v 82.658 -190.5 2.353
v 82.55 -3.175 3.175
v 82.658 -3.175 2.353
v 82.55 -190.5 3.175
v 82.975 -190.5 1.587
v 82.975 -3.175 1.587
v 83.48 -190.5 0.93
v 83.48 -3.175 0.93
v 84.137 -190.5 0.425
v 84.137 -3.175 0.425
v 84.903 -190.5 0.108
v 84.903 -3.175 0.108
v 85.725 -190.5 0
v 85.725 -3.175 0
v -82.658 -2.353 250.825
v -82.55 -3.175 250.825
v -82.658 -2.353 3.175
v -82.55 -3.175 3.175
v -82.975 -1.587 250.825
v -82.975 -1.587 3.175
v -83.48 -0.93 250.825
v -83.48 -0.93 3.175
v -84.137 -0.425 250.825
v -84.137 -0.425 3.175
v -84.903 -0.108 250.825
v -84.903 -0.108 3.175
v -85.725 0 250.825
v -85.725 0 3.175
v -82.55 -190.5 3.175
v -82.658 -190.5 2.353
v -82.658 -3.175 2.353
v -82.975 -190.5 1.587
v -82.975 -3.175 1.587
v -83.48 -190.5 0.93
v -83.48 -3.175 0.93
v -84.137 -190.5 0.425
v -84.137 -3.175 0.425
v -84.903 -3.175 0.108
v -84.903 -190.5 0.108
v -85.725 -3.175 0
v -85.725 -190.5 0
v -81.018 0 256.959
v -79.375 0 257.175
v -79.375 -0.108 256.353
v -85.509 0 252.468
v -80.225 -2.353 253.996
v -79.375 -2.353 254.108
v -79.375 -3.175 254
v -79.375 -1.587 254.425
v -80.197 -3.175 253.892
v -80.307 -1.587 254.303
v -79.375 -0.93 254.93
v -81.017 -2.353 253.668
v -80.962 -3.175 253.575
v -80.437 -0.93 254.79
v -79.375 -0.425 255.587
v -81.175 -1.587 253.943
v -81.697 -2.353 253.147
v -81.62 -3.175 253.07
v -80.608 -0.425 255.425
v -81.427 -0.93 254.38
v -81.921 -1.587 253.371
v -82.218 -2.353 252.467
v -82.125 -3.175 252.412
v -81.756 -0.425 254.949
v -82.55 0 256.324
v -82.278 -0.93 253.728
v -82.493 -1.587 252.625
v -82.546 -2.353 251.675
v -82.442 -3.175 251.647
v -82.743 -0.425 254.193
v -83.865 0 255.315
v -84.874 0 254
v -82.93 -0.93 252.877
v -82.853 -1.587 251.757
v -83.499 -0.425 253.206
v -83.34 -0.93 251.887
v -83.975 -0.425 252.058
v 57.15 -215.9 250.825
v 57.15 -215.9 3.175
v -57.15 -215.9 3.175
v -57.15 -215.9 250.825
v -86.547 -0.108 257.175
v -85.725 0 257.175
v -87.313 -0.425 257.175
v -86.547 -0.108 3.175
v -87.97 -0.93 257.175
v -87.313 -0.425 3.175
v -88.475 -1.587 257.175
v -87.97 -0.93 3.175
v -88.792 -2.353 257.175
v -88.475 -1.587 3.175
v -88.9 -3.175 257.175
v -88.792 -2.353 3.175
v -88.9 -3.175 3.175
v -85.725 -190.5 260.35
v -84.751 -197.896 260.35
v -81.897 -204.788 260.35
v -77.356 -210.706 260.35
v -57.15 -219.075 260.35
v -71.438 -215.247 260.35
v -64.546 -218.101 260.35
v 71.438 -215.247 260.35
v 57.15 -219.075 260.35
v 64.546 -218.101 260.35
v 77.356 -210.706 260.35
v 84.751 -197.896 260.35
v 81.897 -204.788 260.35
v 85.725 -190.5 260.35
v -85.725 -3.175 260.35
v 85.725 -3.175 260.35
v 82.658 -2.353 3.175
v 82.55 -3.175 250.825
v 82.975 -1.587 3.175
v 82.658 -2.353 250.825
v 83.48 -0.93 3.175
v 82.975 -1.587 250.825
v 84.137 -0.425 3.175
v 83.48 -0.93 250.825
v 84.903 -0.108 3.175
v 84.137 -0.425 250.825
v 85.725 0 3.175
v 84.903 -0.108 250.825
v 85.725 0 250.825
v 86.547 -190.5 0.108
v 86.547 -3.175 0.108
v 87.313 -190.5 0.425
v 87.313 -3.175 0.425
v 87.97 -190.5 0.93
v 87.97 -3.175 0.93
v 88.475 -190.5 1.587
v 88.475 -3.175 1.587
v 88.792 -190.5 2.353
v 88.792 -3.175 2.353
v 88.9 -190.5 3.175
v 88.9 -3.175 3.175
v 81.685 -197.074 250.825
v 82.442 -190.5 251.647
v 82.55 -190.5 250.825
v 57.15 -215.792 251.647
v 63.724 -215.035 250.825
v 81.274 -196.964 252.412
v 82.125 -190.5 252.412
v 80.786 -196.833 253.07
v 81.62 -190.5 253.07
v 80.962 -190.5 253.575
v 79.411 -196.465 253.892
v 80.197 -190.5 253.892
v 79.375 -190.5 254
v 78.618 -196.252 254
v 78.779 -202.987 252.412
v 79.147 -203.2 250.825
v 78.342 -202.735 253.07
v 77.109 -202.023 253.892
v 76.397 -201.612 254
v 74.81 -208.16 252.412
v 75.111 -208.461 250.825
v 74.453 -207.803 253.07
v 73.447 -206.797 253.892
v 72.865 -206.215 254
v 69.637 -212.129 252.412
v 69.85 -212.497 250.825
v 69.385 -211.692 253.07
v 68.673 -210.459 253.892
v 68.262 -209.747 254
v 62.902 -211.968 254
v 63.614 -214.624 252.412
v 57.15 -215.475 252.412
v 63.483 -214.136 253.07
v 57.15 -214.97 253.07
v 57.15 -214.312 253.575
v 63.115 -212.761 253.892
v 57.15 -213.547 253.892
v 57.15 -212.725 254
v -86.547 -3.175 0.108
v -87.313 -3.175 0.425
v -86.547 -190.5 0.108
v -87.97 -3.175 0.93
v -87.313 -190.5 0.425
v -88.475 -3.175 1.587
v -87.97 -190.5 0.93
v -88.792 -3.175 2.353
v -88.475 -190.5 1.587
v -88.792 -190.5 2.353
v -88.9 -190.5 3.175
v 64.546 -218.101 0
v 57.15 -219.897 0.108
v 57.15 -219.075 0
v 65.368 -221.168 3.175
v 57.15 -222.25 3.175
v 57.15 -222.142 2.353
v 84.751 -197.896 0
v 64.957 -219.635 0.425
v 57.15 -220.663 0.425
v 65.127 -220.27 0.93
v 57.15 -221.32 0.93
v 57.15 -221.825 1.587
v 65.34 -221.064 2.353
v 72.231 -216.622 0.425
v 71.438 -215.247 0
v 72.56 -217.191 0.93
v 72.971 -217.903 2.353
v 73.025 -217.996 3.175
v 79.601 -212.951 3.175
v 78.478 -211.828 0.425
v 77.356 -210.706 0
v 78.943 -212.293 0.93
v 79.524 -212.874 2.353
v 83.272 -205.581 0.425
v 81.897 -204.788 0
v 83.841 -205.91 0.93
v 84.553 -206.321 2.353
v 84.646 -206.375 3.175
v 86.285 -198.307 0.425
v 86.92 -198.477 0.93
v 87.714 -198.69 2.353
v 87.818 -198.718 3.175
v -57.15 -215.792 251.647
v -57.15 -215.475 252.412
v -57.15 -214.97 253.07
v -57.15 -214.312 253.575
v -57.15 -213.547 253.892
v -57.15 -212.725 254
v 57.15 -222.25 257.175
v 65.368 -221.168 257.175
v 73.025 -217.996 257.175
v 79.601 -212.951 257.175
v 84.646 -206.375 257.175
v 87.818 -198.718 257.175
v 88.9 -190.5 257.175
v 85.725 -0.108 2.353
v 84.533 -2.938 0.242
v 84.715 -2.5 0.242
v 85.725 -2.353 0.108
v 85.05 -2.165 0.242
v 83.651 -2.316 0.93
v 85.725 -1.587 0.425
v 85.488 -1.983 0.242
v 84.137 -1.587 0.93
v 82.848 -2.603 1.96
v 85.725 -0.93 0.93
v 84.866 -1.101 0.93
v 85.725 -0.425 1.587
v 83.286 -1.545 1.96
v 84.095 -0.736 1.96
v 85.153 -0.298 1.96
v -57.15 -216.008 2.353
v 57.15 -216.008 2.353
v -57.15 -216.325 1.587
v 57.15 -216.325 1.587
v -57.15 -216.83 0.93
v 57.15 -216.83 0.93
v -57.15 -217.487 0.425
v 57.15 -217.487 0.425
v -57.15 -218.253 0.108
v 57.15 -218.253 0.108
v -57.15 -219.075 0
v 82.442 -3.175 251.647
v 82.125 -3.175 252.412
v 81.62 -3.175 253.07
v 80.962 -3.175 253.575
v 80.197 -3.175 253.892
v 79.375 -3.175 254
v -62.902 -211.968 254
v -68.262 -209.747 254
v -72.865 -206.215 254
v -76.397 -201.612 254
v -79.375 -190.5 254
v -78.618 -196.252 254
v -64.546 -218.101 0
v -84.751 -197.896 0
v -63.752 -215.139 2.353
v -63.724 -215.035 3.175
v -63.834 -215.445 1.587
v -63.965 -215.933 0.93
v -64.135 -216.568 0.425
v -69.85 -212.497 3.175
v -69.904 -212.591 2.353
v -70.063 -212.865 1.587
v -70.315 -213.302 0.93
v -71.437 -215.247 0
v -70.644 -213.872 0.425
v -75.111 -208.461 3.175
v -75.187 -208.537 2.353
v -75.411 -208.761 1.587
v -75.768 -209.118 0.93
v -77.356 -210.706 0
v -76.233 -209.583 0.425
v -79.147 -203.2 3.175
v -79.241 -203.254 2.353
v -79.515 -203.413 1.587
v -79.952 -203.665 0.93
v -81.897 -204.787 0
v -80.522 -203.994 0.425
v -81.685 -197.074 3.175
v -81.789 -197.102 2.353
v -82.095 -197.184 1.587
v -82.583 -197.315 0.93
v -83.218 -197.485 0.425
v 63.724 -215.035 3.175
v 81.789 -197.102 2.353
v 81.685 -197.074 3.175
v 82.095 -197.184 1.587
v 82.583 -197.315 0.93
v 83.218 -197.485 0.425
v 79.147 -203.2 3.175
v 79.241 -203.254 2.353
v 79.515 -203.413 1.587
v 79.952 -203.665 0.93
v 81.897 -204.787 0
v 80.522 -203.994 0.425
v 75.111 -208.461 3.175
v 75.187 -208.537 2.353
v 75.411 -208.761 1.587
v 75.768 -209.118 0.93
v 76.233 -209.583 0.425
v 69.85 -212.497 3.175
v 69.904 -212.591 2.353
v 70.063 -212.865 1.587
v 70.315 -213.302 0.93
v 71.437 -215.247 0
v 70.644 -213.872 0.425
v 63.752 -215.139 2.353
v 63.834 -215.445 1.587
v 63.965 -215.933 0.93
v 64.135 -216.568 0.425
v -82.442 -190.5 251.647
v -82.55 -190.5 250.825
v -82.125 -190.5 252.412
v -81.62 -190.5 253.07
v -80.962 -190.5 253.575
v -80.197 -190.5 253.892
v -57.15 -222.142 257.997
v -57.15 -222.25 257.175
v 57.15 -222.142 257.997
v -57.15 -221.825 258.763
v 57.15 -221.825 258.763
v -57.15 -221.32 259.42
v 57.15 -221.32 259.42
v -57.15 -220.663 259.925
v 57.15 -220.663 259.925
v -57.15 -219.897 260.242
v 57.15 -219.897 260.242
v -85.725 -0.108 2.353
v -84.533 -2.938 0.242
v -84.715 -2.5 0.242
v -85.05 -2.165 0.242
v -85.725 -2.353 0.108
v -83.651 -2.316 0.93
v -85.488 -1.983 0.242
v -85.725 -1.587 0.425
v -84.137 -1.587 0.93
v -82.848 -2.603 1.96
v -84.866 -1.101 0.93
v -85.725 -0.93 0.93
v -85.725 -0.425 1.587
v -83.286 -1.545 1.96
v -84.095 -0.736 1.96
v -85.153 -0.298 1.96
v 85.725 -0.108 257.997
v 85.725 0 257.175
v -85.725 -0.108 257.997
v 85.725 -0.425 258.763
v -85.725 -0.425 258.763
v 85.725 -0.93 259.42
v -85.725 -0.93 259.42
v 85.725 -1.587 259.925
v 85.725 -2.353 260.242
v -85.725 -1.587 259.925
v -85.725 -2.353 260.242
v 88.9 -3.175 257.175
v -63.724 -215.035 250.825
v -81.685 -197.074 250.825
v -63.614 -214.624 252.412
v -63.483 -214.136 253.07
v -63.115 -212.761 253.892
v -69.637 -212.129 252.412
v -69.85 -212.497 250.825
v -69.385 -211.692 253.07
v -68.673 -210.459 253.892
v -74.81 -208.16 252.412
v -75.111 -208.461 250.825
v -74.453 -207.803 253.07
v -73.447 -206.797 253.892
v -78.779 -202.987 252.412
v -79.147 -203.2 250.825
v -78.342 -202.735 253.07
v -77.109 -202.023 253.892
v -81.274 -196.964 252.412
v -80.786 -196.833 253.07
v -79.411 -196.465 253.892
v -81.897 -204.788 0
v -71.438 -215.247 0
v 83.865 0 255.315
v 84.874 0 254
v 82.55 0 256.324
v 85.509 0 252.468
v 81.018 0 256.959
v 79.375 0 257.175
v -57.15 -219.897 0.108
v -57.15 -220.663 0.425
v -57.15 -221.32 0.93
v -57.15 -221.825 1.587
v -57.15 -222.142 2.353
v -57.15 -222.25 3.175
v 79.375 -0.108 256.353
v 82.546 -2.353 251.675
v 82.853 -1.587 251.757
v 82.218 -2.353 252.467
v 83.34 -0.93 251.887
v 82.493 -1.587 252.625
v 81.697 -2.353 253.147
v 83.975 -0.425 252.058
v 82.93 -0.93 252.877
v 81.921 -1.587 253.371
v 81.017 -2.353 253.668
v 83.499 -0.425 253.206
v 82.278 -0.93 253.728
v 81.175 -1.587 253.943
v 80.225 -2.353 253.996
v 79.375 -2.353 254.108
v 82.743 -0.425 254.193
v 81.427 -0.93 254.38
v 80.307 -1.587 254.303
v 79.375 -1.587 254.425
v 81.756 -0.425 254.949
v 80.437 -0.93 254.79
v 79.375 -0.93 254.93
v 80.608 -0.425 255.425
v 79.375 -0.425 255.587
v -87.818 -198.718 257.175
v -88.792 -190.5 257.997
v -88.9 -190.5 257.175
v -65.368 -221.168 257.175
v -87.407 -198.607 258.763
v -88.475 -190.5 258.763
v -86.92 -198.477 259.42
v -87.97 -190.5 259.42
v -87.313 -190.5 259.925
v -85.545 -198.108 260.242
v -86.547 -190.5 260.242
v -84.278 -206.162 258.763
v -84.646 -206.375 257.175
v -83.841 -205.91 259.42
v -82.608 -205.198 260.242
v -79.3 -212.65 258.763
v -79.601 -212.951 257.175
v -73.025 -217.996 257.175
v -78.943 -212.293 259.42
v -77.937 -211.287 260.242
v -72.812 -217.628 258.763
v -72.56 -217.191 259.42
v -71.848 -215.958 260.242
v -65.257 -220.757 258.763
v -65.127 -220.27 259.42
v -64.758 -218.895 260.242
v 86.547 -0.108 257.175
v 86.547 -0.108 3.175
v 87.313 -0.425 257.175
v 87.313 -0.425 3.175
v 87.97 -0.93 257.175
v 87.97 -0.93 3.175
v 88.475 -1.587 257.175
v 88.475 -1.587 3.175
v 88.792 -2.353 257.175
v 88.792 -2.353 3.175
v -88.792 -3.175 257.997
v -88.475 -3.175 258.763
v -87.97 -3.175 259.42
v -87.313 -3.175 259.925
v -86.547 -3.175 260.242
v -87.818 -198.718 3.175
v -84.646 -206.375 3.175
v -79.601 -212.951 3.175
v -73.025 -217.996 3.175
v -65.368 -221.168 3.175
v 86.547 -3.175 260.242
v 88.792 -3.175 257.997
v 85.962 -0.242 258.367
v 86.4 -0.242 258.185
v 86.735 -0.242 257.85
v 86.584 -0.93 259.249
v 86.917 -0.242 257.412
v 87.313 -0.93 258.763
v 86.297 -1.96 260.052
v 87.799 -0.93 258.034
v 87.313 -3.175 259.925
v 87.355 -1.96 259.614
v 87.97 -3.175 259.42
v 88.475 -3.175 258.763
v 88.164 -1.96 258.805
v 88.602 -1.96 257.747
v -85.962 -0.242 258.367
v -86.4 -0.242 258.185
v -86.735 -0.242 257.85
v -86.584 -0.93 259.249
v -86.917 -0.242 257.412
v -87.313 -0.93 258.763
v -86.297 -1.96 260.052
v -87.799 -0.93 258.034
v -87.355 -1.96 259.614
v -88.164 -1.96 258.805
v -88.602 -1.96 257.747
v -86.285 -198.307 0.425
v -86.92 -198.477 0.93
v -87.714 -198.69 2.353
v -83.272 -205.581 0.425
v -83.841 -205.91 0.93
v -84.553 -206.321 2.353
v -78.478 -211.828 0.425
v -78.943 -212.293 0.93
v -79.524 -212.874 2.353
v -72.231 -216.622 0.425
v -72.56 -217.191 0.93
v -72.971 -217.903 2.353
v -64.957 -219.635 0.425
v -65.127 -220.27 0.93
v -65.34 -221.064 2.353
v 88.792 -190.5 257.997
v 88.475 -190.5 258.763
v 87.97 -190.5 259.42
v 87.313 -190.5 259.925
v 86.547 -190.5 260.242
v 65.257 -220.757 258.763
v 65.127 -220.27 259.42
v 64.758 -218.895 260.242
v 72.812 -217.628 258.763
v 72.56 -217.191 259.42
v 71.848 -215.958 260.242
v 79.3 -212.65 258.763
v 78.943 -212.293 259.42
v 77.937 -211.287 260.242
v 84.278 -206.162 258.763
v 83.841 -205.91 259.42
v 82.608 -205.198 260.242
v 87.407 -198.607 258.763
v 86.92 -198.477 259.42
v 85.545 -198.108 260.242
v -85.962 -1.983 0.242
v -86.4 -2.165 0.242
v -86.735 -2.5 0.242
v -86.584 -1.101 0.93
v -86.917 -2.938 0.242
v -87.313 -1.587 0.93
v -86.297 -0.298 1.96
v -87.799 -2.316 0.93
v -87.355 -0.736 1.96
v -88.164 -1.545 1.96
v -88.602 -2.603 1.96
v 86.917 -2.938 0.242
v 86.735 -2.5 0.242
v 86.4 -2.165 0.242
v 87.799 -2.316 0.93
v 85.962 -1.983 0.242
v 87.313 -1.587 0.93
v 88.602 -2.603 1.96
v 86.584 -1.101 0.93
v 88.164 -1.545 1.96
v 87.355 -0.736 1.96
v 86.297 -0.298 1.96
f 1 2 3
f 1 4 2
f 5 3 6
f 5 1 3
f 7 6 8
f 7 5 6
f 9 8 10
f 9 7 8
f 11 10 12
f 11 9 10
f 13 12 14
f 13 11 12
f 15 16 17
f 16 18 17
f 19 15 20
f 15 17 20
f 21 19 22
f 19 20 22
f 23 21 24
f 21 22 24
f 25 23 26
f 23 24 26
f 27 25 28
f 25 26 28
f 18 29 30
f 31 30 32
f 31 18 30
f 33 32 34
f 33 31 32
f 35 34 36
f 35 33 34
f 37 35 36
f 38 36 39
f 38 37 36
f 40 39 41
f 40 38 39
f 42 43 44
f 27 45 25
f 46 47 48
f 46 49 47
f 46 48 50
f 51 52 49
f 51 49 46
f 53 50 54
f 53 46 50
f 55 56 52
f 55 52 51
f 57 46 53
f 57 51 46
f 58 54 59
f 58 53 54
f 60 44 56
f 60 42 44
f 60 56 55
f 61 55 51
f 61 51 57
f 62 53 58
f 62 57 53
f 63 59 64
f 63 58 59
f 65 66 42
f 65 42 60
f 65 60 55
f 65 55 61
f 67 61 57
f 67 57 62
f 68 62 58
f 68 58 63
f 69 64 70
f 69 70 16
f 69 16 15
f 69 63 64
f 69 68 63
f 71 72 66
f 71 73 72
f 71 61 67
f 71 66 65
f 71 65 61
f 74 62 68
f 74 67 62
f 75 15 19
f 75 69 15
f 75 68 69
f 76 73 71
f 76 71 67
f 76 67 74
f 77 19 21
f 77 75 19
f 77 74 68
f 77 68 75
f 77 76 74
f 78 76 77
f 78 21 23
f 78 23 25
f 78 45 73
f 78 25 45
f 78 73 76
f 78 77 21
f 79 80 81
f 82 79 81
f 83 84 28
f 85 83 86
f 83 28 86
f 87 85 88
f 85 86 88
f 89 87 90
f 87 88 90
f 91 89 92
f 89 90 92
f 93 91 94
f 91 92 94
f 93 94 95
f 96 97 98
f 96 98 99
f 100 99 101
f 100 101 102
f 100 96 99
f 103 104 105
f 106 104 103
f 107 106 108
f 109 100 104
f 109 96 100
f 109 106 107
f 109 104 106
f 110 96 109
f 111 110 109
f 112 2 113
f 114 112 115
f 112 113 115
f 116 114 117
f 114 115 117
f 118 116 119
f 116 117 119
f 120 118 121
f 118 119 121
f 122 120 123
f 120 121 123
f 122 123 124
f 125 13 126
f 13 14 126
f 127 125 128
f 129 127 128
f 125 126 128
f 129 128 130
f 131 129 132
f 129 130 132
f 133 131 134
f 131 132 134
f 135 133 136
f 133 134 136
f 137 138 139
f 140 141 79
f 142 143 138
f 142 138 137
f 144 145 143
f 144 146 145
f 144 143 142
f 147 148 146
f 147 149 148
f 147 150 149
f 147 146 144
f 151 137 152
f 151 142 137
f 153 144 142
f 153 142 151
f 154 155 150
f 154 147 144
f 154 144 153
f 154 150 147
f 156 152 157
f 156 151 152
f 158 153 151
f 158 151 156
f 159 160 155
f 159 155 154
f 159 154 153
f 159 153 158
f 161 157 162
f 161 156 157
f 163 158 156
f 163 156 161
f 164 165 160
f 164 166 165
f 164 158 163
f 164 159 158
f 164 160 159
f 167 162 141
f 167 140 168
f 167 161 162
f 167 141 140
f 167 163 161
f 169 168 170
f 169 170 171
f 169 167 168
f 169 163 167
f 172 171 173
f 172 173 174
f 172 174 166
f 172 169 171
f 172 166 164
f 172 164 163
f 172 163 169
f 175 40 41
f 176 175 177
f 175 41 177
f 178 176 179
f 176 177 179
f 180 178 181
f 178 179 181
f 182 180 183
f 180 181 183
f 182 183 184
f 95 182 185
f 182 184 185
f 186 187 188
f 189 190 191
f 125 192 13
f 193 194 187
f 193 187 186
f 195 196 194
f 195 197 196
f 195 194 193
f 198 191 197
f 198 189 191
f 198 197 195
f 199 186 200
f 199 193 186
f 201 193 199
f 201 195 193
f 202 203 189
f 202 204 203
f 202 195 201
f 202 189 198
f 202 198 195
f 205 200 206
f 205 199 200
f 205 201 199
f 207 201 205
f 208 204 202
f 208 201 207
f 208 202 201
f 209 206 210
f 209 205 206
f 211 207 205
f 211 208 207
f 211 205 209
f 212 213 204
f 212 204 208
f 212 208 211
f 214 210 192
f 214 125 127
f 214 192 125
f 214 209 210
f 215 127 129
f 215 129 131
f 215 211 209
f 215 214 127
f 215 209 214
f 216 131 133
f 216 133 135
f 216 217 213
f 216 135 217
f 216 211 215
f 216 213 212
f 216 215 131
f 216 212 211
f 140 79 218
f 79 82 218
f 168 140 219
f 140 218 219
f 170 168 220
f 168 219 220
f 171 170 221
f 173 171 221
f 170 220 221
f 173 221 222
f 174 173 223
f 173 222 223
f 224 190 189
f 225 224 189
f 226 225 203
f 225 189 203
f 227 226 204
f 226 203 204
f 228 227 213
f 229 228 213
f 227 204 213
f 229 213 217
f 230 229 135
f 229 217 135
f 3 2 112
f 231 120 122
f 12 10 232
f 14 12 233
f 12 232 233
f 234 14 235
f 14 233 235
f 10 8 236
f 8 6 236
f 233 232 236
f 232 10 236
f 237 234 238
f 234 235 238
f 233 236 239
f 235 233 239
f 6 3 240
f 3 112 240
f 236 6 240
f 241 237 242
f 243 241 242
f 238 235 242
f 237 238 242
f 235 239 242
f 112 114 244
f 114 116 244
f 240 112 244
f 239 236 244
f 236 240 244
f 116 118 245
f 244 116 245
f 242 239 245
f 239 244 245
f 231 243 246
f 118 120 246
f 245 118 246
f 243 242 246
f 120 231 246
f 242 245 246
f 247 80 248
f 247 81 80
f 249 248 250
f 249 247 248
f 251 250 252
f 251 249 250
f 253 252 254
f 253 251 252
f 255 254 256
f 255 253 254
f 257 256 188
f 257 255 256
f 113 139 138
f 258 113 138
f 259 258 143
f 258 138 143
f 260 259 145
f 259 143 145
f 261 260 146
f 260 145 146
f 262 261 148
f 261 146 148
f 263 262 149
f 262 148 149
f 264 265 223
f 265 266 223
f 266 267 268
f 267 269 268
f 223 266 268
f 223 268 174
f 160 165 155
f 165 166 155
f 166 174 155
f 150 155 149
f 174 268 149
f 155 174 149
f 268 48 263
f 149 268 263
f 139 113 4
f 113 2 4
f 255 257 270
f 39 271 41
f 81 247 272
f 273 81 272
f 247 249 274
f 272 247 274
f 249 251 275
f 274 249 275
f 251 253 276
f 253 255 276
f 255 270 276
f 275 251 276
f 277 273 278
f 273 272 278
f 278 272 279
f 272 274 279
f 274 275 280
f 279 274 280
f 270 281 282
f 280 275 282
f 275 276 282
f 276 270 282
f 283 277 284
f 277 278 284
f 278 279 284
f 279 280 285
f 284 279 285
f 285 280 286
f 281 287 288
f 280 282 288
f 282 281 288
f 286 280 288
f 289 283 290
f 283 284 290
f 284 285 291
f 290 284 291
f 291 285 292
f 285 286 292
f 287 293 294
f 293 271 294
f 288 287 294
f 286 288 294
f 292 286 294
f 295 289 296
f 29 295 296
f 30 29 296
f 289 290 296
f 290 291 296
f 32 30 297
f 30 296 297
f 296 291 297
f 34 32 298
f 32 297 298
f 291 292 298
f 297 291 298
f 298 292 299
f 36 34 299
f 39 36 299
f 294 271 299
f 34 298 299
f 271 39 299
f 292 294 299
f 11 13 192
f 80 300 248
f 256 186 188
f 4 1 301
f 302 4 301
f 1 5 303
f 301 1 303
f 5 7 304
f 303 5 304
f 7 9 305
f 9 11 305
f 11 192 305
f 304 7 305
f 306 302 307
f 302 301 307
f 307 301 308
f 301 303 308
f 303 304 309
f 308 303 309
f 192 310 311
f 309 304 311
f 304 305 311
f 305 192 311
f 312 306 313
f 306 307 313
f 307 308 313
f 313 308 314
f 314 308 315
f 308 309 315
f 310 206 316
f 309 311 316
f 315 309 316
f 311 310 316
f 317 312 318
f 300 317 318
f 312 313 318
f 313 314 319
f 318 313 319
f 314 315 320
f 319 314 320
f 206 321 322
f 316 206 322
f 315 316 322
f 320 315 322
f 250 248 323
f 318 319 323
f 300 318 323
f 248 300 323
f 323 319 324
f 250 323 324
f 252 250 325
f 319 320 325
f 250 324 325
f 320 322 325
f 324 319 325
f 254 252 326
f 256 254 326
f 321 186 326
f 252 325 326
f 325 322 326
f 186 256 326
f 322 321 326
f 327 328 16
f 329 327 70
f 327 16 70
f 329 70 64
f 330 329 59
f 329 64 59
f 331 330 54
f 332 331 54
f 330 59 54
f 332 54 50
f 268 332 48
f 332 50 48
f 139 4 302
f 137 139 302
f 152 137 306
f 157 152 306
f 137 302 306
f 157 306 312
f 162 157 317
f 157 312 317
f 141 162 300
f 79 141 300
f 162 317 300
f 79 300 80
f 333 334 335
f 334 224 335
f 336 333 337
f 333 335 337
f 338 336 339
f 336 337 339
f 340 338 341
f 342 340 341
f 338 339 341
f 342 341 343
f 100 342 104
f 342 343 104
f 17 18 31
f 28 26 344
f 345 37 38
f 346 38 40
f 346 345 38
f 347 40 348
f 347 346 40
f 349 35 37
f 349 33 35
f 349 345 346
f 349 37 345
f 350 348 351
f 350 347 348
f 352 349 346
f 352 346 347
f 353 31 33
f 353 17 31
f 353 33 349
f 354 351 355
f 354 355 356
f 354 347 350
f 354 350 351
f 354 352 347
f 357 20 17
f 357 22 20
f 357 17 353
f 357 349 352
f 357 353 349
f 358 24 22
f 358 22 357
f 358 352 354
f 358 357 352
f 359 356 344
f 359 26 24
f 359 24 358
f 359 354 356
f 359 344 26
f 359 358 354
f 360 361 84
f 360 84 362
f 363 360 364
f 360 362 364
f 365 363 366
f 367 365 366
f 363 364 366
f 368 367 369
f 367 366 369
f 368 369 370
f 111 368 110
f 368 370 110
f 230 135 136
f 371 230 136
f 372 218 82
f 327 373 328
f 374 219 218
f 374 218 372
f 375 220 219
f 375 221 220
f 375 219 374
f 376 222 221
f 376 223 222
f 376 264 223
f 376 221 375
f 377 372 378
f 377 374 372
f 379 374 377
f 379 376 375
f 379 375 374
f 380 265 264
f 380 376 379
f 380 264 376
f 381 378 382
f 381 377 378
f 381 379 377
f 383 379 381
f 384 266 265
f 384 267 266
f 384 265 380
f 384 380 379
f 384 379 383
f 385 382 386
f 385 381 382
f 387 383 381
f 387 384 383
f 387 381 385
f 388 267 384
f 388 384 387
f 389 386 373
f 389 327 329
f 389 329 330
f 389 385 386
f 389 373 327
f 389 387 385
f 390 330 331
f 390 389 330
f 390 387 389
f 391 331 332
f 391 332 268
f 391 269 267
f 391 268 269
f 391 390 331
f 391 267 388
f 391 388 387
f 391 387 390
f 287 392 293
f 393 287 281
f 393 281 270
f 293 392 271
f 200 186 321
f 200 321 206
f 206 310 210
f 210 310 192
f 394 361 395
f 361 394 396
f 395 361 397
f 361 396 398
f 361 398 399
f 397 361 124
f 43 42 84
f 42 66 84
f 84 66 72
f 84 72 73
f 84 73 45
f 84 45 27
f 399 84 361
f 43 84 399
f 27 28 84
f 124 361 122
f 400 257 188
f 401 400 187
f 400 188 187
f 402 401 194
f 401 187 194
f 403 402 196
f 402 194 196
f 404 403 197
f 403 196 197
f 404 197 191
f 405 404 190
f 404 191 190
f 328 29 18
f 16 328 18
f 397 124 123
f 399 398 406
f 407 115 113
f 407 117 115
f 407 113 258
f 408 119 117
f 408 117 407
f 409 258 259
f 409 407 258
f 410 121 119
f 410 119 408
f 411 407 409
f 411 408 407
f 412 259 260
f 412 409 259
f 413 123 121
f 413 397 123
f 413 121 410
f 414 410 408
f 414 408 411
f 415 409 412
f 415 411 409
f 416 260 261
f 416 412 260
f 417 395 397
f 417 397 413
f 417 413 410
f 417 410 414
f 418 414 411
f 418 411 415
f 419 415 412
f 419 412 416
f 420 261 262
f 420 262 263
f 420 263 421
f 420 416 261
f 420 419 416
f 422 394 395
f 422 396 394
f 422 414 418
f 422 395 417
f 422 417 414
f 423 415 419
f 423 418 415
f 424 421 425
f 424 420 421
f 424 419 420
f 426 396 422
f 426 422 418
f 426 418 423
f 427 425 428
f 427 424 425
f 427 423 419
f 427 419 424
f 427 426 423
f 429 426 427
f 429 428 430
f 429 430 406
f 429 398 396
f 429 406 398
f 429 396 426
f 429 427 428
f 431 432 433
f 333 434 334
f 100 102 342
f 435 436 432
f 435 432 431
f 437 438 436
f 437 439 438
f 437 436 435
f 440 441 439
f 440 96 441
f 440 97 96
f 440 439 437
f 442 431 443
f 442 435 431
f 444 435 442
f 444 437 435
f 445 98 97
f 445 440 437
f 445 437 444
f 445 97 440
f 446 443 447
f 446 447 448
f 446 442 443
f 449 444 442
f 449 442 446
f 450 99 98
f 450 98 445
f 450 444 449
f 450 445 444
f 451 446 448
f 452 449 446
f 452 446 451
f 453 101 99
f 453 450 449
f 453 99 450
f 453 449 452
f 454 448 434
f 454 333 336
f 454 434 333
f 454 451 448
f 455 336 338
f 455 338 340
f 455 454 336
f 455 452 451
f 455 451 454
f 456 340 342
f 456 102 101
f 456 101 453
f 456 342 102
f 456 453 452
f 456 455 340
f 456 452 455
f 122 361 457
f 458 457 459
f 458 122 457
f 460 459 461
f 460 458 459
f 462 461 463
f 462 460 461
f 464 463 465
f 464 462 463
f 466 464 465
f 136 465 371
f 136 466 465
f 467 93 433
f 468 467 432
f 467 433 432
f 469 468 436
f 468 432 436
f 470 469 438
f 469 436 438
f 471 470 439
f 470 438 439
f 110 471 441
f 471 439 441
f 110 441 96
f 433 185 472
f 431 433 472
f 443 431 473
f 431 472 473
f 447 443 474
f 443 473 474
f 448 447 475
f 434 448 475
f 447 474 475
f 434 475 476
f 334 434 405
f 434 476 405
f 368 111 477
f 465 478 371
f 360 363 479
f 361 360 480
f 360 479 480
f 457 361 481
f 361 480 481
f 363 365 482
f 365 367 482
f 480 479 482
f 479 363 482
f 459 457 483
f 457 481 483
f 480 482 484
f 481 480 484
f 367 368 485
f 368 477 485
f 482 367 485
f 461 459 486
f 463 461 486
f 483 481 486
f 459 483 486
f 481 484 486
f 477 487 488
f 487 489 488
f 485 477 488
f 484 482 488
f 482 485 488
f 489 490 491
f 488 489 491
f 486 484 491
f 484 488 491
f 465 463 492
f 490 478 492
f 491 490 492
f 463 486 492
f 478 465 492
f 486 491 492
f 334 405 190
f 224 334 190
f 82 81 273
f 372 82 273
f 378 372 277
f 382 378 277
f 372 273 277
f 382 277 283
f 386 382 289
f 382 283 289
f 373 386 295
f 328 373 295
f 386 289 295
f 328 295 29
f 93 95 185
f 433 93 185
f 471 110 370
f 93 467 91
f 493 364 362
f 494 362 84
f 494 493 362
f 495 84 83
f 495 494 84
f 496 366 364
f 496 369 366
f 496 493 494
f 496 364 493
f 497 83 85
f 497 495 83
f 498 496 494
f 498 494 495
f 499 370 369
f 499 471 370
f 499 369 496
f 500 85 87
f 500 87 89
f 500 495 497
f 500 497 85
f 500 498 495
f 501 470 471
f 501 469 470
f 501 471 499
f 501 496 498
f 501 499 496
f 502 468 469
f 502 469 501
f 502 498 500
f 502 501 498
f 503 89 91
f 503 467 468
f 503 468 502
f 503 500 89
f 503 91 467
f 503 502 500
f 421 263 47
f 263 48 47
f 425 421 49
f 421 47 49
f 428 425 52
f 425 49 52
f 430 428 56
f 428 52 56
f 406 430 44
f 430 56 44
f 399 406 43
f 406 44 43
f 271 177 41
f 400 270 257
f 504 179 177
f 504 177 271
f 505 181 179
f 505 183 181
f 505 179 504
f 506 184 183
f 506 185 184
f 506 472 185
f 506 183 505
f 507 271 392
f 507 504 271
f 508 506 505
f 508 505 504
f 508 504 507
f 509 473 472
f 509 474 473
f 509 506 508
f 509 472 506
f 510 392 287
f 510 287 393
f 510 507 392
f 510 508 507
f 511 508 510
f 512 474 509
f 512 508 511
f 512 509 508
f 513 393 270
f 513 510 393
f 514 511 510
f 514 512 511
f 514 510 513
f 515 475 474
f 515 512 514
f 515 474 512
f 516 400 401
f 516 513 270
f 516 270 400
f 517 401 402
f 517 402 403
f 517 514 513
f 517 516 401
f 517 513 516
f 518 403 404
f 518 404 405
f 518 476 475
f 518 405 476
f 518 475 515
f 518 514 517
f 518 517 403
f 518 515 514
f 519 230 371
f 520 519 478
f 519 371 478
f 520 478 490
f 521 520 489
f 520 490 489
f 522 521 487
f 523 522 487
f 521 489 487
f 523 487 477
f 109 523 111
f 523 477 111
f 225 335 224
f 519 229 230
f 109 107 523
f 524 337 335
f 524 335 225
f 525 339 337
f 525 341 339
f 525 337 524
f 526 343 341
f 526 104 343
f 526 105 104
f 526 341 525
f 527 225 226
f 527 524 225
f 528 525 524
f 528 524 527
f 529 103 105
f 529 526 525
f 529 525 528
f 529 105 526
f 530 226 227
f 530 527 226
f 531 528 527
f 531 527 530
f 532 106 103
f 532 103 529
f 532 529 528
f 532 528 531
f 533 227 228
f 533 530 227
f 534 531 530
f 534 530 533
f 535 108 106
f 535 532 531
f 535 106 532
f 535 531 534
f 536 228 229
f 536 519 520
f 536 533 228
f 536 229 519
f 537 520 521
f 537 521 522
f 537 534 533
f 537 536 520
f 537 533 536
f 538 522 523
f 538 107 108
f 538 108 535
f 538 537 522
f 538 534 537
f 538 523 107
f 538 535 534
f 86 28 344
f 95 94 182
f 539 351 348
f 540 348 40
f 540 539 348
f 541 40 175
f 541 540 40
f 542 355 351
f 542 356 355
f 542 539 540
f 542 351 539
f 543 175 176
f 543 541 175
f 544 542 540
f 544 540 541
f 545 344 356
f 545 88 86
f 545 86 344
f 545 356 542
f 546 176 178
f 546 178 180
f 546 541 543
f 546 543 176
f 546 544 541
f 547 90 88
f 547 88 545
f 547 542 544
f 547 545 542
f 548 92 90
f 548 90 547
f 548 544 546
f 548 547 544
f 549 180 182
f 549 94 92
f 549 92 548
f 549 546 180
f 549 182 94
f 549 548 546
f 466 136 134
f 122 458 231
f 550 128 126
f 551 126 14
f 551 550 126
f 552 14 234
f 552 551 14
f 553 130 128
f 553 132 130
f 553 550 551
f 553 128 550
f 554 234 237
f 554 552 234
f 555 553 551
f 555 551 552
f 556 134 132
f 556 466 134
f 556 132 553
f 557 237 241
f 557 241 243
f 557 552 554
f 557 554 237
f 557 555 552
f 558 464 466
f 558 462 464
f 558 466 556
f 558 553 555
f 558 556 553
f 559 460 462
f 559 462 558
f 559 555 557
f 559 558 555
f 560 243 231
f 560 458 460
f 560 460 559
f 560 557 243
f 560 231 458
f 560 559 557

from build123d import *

# Parameters (mm, degrees)
F1_DEPTH = 254
F3_DEPTH = 6.35
F4_F1_R  = 3.175
F4_F2_R  = 3.1749


# Not quite as in the source:
# - a fillet or chamfer is up to 0.001 mm smaller than in the source, because OpenCascade refuses the exact size


with BuildPart() as f1:
    # F0 (on Top) → F1 (new body)
    with BuildSketch(Plane.XY):
        with BuildLine():
            Line((57.15, -215.9), (-57.15, -215.9))
            ThreePointArc((-57.15, -215.9), (-75.1105122421, -208.4605122421), (-82.55, -190.5))
            Line((-82.55, -190.5), (-82.55, 0))
            Line((-82.55, 0), (-88.9, 0))
            Line((-88.9, 0), (-88.9, -190.5))
            ThreePointArc((-88.9, -190.5), (-79.6006403027, -212.9506403027), (-57.15, -222.25))
            Line((-57.15, -222.25), (57.15, -222.25))
            ThreePointArc((57.15, -222.25), (79.6006403027, -212.9506403027), (88.9, -190.5))
            Line((88.9, -190.5), (88.9, 0))
            Line((88.9, 0), (82.55, 0))
            Line((82.55, 0), (82.55, -190.5))
            ThreePointArc((82.55, -190.5), (75.1105122421, -208.4605122421), (57.15, -215.9))
        make_face()
    extrude(amount=F1_DEPTH)

    # F2 (on face) → F3 (join)
    with BuildSketch(Plane.XY.offset(254)):
        with BuildLine():
            Line((82.55, 0), (-82.55, 0))
            Line((-82.55, 0), (-82.55, -190.5))
            ThreePointArc((-82.55, -190.5), (-75.1105122421, -208.4605122421), (-57.15, -215.9))
            Line((-57.15, -215.9), (57.15, -215.9))
            ThreePointArc((57.15, -215.9), (75.1105122421, -208.4605122421), (82.55, -190.5))
            Line((82.55, -190.5), (82.55, 0))
        make_face()
        with BuildLine():
            Line((-82.55, 0), (-88.9, 0))
            Line((-88.9, 0), (-88.9, -190.5))
            ThreePointArc((-88.9, -190.5), (-79.6006403027, -212.9506403027), (-57.15, -222.25))
            Line((-57.15, -222.25), (57.15, -222.25))
            ThreePointArc((57.15, -222.25), (79.6006403027, -212.9506403027), (88.9, -190.5))
            Line((88.9, -190.5), (88.9, 0))
            Line((88.9, 0), (82.55, 0))
            Line((82.55, 0), (82.55, -190.5))
            ThreePointArc((82.55, -190.5), (75.1105122421, -208.4605122421), (57.15, -215.9))
            Line((57.15, -215.9), (-57.15, -215.9))
            ThreePointArc((-57.15, -215.9), (-75.1105122421, -208.4605122421), (-82.55, -190.5))
            Line((-82.55, -190.5), (-82.55, 0))
        make_face()
    extrude(amount=F3_DEPTH)

    # F4: fillet of radius 3.175 on 23 edges, made by hand

    # F4_f1
    f4_f1_edges = [f1.edges().sort_by_distance(p)[0] for p in [
        (75.1105122421, -208.4605122421, 254),
        (82.55, -95.25, 254),
        (0, -215.9, 254),
        (-75.1105122421, -208.4605122421, 254),
        (-82.55, -95.25, 254),
    ]]
    fillet(f4_f1_edges, radius=F4_F1_R)

    # F4_f2 (radius 3.175 in the source; OpenCascade refuses exactly that, so slightly less here)
    f4_f2_edges = [f1.edges().sort_by_distance(p)[0] for p in [
        (-88.9, -95.25, 260.35),
        (-79.6006403027, -212.9506403027, 260.35),
        (0, -222.25, 260.35),
        (79.6006403027, -212.9506403027, 260.35),
        (88.9, -95.25, 260.35),
        (0, 0, 260.35),
        (88.9, 0, 130.175),
        (-88.9, 0, 130.175),
        (82.55, 0, 125.4125),
        (-82.55, 0, 125.4125),
        (75.1105122421, -208.4605122421, 0),
        (0, -215.9, 0),
        (-75.1105122421, -208.4605122421, 0),
        (-82.55, -95.25, 0),
        (-85.725, 0, 0),
        (-88.9, -95.25, 0),
        (-79.6006403027, -212.9506403027, 0),
        (0, -222.25, 0),
        (79.6006403027, -212.9506403027, 0),
        (88.9, -95.25, 0),
        (85.725, 0, 0),
        (82.55, -95.25, 0),
        (-81.6200640303, 0, 253.0700640303),
        (81.6200640303, 0, 253.0700640303),
    ]]
    fillet(f4_f2_edges, radius=F4_F2_R)


solid = f1.part
